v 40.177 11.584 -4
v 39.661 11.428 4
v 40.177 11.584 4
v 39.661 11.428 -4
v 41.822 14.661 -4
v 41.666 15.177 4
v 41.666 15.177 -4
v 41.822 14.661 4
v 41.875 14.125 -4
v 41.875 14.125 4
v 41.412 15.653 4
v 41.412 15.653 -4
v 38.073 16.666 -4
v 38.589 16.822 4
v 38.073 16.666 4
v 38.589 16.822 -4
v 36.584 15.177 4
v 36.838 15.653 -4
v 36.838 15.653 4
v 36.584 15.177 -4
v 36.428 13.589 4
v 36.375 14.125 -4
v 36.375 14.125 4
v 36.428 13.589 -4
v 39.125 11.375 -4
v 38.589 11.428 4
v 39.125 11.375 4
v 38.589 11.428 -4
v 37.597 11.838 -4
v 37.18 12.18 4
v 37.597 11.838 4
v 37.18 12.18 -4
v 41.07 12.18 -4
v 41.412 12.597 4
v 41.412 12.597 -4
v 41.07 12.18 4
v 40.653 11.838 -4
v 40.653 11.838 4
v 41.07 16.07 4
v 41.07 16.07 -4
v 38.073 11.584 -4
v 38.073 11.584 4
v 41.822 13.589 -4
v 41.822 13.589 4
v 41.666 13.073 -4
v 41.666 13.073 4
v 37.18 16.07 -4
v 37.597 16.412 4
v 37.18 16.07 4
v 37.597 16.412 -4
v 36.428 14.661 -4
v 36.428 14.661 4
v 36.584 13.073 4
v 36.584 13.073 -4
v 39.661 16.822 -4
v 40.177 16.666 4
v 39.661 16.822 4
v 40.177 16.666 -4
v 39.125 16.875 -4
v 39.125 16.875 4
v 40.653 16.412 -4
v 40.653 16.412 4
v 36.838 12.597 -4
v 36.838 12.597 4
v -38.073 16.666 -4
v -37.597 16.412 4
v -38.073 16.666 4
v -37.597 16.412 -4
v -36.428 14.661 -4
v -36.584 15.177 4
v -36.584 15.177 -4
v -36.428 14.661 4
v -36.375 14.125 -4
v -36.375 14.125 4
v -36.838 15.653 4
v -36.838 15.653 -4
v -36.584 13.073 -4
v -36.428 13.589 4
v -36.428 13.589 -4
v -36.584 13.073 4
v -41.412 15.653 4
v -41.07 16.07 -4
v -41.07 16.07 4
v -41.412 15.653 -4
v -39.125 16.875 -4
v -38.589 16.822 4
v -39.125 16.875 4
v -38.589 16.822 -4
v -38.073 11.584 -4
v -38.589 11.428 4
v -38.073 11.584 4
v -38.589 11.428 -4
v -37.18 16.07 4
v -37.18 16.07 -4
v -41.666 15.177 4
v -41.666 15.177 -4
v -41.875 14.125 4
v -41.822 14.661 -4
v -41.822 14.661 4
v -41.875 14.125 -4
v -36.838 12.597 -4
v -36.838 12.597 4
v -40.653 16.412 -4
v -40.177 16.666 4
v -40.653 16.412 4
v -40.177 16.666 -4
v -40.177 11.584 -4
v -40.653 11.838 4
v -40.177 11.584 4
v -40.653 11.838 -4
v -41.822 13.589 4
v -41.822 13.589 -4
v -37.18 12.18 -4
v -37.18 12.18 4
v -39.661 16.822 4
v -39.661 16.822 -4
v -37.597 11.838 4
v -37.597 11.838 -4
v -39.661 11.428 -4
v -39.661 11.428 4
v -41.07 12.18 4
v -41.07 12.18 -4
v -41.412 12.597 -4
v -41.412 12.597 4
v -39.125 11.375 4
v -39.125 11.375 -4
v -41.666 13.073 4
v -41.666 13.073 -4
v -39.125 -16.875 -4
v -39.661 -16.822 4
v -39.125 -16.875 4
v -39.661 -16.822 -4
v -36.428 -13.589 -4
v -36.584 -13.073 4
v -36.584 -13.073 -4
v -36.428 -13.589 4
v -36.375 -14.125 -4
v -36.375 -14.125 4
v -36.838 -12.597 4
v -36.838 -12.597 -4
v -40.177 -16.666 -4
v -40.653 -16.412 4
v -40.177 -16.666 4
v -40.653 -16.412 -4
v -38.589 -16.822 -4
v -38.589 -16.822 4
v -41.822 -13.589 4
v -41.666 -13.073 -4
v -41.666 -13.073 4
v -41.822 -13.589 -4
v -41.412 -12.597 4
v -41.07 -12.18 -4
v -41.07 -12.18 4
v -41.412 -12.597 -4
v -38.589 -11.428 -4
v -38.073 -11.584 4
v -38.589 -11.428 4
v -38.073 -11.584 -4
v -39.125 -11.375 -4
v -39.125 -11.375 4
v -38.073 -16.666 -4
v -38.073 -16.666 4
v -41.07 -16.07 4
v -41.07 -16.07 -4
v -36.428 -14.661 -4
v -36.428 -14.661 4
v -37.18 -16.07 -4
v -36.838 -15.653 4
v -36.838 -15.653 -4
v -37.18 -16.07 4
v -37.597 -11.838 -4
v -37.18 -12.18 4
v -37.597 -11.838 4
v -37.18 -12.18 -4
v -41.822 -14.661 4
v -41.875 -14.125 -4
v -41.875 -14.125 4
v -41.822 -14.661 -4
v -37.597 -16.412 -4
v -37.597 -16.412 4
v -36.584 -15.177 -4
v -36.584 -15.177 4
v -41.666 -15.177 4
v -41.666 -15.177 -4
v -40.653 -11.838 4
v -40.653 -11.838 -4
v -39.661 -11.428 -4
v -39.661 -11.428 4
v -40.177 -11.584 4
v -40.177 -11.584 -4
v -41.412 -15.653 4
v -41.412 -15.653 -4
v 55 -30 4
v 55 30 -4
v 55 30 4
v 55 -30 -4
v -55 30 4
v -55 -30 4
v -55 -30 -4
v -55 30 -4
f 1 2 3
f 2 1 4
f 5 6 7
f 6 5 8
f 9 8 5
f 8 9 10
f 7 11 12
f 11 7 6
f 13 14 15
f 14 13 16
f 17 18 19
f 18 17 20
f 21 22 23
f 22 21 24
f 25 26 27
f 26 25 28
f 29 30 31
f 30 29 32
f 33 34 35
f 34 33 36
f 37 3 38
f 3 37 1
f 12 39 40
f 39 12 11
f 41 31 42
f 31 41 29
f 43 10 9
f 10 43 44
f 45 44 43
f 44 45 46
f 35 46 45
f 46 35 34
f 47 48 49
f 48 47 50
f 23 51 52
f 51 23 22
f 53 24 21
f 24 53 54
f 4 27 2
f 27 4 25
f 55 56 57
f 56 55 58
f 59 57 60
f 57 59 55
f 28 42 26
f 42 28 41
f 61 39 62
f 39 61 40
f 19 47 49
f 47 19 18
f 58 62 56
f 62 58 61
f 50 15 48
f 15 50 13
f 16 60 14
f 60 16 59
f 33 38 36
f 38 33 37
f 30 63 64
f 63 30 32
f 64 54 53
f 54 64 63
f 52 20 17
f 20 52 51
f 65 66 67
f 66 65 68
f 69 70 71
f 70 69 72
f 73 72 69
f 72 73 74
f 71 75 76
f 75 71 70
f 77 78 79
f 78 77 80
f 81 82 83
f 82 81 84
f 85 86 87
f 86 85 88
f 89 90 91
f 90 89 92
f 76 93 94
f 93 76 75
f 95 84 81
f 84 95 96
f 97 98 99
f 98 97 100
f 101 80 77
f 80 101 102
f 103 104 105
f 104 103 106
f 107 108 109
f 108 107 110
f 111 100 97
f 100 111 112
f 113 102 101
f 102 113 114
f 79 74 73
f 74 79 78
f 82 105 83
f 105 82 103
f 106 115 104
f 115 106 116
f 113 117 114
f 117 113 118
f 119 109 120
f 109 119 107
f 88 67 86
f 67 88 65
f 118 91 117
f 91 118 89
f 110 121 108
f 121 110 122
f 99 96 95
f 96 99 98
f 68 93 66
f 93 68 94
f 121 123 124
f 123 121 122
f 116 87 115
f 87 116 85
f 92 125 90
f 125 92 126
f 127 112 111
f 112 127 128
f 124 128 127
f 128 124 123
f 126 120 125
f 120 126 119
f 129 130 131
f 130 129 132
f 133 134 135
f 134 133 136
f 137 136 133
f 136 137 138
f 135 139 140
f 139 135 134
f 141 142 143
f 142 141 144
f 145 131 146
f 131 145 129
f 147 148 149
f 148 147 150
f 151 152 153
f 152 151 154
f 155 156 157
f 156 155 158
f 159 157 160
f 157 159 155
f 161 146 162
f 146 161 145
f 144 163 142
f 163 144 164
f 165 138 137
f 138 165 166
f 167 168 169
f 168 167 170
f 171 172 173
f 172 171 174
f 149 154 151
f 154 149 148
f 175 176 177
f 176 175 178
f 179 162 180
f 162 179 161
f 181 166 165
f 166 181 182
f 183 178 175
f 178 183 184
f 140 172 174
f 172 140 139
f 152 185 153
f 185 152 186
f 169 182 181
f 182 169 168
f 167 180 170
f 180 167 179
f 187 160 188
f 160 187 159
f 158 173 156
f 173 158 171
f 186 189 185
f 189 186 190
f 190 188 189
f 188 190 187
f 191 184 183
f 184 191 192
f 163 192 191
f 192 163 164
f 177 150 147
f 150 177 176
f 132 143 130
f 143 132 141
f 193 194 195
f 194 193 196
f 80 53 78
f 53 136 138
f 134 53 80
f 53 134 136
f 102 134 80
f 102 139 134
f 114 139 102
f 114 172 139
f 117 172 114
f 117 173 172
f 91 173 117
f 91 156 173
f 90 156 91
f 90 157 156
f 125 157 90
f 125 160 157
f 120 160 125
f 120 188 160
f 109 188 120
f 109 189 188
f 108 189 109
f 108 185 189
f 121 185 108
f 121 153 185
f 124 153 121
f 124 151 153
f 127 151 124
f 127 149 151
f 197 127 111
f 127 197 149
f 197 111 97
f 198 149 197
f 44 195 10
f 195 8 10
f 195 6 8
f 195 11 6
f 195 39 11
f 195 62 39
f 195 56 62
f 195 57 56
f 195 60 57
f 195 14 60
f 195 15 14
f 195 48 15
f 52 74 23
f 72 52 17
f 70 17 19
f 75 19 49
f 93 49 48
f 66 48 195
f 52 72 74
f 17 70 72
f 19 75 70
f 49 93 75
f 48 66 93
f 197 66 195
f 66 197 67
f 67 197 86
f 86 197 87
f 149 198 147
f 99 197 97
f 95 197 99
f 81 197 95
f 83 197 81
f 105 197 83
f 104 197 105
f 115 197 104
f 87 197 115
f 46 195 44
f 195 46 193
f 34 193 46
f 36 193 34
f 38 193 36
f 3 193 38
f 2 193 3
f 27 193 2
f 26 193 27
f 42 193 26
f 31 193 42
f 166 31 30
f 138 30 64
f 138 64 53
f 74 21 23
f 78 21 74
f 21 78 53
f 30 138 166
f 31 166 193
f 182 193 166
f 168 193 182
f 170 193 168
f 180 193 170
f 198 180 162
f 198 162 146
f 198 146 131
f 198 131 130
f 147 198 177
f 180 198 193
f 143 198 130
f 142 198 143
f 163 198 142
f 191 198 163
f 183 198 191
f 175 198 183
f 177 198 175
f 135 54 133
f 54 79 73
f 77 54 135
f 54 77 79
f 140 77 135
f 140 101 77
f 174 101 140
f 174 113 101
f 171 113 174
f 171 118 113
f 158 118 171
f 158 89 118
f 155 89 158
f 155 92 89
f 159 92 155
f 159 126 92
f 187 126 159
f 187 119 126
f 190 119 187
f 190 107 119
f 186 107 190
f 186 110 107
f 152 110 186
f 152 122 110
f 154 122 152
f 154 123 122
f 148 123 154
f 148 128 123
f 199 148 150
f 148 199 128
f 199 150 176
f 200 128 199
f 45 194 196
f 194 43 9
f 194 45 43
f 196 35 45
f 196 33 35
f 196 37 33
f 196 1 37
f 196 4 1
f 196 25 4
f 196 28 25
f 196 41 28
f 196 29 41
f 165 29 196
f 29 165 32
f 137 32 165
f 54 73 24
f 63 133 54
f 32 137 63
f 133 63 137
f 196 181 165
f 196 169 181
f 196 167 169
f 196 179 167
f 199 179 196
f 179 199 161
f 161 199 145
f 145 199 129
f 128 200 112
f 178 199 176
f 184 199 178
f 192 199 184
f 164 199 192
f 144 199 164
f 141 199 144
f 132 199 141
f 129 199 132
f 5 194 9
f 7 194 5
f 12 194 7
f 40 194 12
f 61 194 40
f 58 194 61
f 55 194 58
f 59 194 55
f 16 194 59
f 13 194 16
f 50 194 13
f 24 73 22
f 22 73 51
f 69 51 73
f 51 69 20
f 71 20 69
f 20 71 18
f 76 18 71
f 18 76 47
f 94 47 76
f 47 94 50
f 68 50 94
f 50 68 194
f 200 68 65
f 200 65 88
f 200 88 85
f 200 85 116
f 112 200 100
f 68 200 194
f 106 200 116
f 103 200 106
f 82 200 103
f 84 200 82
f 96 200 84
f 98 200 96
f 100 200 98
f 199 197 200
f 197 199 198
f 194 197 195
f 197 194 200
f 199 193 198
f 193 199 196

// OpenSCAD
$fn = 32;

// ----------------------------------------------------------------------
// Corner plate 110 x 60 x 8
// 3 holes, centres taken from the edge offset
// ----------------------------------------------------------------------

// --- parameters (mm) ---
plate = [110, 60, 8];  // overall size (x, y, z)
holes = 3;             // number of holes the drawing asks for
hole_d = 5.5;          // hole diameter
edge = 15.875;         // hole centre offset from the plate edge

// --- derived feature positions (mm) ---
corner_x = plate[0] / 2 - edge;  // = 39.12   corner hole X
corner_y = plate[1] / 2 - edge;  // = 14.12   corner hole Y
feature_centers = [
  [corner_x, corner_y],
  [-corner_x, corner_y],
  [-corner_x, -corner_y]
];   // hole centres the loop below drills

// plate outline, every hole drilled through with the same cutters
difference() {
  cube(plate, center = true);
  for (centre = feature_centers)
    translate([centre[0], centre[1], 0])
      cylinder(d = hole_d, h = plate[2] + 2, center = true);
}
